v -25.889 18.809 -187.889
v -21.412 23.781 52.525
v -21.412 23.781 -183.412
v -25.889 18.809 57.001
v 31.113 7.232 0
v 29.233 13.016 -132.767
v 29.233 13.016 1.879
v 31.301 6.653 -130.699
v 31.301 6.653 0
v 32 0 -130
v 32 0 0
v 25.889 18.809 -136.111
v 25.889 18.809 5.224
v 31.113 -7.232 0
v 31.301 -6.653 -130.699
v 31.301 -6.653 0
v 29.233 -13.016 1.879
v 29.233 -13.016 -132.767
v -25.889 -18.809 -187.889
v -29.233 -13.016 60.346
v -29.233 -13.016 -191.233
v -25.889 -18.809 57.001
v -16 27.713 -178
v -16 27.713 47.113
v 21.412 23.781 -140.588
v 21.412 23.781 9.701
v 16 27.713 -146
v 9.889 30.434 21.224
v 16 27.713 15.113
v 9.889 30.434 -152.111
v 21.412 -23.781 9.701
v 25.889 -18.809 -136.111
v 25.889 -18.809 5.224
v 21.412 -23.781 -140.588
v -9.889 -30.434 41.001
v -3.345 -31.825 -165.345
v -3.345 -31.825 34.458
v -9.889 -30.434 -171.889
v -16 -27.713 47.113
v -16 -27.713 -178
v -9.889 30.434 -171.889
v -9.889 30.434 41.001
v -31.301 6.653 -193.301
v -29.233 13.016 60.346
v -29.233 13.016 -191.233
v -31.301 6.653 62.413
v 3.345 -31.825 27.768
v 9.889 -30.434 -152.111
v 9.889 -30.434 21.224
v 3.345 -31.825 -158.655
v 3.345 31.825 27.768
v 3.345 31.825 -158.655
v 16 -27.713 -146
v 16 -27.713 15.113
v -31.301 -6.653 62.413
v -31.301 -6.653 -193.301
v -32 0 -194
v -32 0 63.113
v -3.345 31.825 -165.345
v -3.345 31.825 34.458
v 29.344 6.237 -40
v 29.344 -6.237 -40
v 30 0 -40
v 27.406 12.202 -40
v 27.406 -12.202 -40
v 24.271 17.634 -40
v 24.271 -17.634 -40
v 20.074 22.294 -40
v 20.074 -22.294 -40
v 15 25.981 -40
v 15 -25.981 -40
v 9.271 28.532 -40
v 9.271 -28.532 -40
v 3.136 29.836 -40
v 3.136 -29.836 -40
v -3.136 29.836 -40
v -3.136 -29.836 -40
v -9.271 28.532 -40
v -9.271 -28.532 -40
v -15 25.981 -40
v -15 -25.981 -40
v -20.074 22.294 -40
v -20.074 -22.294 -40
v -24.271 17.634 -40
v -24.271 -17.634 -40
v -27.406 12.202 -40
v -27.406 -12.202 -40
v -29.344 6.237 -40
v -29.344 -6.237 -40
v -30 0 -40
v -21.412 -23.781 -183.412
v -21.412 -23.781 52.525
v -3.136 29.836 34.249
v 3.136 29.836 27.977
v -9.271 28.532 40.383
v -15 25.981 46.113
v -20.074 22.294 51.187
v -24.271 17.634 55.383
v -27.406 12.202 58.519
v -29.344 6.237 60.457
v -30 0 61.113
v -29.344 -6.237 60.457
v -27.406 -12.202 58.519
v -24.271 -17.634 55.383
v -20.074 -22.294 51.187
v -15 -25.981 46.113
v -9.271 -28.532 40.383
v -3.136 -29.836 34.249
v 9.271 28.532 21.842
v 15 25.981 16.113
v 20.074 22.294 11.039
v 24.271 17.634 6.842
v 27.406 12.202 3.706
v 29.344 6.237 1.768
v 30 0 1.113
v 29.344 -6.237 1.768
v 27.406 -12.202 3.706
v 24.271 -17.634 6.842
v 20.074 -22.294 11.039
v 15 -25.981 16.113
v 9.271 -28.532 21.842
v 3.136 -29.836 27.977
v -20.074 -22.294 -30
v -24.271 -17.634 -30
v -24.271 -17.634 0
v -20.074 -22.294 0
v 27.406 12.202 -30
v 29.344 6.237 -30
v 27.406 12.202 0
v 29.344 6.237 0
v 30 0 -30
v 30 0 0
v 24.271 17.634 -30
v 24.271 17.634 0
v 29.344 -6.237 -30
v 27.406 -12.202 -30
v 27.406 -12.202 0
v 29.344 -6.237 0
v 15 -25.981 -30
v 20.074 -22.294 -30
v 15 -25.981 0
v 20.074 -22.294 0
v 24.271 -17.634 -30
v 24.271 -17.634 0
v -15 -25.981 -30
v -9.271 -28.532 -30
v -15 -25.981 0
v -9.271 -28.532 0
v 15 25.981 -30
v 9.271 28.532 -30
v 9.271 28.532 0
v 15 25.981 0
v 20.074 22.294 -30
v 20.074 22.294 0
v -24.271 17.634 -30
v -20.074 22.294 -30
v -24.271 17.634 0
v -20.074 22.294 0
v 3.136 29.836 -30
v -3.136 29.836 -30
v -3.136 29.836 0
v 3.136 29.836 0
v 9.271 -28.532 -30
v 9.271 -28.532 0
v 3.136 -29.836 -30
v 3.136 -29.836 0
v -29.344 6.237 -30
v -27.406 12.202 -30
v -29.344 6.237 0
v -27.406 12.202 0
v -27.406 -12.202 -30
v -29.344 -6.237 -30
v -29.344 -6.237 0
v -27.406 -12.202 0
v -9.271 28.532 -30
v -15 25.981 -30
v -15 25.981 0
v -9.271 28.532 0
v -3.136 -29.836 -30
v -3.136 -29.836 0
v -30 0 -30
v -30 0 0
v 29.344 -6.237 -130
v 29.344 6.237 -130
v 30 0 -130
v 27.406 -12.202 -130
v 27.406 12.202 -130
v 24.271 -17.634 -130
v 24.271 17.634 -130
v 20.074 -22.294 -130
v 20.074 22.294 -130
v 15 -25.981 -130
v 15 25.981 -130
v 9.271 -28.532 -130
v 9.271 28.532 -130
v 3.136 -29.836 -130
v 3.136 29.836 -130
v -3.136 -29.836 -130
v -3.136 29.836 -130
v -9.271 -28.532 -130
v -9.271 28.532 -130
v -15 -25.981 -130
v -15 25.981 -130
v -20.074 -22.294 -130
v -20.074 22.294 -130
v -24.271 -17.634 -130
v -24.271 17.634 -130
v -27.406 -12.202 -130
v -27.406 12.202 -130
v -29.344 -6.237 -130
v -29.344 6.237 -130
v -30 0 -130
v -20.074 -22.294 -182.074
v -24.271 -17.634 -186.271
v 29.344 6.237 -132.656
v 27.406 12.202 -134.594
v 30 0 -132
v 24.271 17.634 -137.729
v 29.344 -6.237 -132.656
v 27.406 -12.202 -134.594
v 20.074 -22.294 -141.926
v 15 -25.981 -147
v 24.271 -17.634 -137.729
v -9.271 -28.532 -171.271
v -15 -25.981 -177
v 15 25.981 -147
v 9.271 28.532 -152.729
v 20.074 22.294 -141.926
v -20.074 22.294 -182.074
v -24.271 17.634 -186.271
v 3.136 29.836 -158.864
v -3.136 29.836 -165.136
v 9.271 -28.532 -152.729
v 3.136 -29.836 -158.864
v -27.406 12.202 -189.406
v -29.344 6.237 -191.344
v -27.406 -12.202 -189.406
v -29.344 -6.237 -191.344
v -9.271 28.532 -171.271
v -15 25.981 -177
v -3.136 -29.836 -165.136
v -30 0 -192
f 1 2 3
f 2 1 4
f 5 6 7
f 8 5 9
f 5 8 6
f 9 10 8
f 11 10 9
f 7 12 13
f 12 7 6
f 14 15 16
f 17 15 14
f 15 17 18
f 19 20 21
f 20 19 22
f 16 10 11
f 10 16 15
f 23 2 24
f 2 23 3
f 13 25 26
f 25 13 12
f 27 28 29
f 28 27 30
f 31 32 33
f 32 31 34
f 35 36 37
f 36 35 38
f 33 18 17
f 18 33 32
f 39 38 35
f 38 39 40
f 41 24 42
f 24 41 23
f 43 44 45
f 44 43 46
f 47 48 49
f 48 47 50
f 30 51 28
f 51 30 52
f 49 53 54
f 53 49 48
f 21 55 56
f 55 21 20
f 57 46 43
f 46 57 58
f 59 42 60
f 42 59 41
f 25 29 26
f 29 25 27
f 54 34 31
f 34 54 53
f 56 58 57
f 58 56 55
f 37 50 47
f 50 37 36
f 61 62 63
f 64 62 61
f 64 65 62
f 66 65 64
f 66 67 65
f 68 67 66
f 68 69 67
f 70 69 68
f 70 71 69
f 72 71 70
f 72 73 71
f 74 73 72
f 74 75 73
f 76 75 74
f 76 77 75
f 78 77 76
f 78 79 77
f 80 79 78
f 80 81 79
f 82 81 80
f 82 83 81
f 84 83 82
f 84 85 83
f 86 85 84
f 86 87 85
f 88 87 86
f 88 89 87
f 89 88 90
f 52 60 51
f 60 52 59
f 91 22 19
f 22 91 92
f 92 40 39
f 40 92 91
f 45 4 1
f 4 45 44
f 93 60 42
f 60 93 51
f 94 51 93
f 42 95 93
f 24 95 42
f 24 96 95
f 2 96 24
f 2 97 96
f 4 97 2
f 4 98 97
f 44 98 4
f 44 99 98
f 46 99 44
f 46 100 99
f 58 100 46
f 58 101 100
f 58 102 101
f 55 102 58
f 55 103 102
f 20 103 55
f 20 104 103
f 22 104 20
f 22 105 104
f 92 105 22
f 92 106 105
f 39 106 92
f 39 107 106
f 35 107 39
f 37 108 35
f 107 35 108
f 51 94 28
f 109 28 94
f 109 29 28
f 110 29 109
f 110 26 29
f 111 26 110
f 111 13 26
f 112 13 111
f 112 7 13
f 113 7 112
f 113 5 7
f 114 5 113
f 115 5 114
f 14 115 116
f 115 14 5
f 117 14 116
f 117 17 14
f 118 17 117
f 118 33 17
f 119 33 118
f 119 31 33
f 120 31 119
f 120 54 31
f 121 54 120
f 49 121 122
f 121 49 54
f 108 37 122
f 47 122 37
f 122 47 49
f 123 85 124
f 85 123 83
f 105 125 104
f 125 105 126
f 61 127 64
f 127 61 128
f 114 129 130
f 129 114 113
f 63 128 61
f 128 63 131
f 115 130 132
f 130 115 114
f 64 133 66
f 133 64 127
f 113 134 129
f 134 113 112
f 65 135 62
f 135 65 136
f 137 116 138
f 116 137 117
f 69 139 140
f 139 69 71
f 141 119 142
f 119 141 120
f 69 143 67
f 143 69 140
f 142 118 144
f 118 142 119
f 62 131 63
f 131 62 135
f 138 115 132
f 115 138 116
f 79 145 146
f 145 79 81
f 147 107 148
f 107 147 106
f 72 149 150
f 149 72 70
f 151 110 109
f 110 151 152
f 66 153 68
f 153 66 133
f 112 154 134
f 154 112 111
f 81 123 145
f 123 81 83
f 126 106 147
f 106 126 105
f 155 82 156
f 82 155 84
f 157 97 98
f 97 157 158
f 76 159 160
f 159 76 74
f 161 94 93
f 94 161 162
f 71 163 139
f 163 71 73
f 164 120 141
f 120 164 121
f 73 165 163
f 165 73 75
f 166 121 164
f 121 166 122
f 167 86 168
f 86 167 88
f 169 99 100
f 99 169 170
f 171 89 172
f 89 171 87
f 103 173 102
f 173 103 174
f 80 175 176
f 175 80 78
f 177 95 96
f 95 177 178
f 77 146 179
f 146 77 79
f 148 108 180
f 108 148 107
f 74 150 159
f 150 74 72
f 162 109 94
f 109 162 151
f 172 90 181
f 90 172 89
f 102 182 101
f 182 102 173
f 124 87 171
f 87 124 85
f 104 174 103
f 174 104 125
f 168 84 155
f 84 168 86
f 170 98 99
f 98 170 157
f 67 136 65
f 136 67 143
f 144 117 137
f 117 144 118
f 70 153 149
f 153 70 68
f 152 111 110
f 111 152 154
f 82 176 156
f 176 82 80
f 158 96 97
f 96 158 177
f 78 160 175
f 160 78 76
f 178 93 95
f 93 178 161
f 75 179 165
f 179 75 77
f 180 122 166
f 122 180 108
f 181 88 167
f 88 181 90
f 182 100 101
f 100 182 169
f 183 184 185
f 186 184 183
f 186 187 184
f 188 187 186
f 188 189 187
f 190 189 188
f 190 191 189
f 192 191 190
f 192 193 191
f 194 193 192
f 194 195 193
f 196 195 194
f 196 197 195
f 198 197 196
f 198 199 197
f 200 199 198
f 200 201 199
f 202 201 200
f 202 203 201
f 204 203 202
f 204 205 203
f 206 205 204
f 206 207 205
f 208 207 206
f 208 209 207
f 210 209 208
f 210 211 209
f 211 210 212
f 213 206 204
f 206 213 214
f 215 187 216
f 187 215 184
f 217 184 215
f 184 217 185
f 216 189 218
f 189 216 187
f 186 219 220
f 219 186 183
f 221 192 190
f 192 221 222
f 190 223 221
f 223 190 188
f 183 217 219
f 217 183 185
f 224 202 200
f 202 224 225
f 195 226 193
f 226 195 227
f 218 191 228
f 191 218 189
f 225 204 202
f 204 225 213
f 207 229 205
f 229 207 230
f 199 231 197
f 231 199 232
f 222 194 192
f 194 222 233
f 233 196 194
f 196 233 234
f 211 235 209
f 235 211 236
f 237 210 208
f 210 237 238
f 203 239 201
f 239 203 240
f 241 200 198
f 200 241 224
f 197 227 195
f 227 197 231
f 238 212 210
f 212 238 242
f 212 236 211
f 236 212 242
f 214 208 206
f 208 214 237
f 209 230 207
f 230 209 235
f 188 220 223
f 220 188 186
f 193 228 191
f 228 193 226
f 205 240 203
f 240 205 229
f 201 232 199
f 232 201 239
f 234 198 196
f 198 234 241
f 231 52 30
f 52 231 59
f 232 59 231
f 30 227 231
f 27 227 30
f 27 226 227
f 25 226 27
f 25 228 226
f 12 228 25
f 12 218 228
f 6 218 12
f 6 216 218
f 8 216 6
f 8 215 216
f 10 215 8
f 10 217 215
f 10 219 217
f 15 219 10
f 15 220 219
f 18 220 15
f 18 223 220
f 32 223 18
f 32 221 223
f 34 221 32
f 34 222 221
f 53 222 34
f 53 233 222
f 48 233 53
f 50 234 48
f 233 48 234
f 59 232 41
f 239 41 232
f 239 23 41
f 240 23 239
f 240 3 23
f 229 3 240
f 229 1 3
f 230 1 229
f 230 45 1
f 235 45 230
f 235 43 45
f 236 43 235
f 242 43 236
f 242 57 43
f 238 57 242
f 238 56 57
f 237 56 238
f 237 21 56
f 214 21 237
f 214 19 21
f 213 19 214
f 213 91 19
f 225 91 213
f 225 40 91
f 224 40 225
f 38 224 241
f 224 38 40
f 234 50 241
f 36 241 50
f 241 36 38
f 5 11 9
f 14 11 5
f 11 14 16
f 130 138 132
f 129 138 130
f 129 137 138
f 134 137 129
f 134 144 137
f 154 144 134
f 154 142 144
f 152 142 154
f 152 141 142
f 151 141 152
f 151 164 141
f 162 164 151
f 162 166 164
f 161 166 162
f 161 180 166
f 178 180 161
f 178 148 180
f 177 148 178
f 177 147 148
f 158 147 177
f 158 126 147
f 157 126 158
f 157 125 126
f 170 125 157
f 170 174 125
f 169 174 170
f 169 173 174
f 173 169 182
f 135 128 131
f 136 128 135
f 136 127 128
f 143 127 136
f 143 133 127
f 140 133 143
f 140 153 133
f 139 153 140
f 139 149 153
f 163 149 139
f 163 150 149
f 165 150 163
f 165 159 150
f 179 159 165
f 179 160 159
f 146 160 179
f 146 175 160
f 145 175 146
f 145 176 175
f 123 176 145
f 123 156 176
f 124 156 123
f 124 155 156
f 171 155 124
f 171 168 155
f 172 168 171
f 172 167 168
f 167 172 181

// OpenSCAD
// file: ../library/meca-comps/meca-comps.scad
// <img src="file:///G:/Mon%20Drive/Cspace%202023%20-%20Karlavagnen/Mod%C3%A9lisation%203D/library/meca-comps/aileron.png">

module aileron(m, n, E, p, epaisseur) {
    CubePoints = [
        [  0,       0,         0 ], //0
        [  E, m-(p+n),         0 ], //1
        [  E,     m-p,         0 ], //2
        [  0,       m,         0 ], //3
        [  0,       0, epaisseur ], //4
        [  E, m-(p+n), epaisseur ], //5
        [  E,     m-p, epaisseur ], //6
        [  0,       m, epaisseur ]  //7
    ];
    
    CubeFaces = [
        [0,1,2,3], // bottom
        [4,5,1,0], // front
        [7,6,5,4], // top
        [5,6,2,1], // right
        [6,7,3,2], // back
        [7,4,0,3]  // left
    ];
    
    translate([0,epaisseur/2,0]) rotate(a=[90,0,0]) color("grey") polyhedron( CubePoints, CubeFaces );
}

// <img src="file:///G:/Mon%20Drive/Cspace%202023%20-%20Karlavagnen/Mod%C3%A9lisation%203D/library/meca-comps/bague_creuse.png">

module bague_creuse(diametre_externe, diametre_interieur, epaisseur) {
    assert(diametre_externe > diametre_interieur, "Le diametre extérieur doit être plus grand que diametre intérieur")
    difference() {
        cylinder(h=epaisseur, d=diametre_externe);
        translate([0,0,-1]) cylinder(h=epaisseur+2, d=diametre_interieur);
    }
}

// <img src="file:///G:/Mon%20Drive/Cspace%202023%20-%20Karlavagnen/Mod%C3%A9lisation%203D/library/meca-comps/bague_de_poussee.png">

module bague_de_poussee(
    diametre_exterieur,
    diametre_intermediaire,
    diametre_interieur,
    epaisseur_exterieure,
    epaisseur_interieure
) {
    union() {
        bague_creuse(diametre_exterieur, diametre_interieur, epaisseur_exterieure, $fn=50);
        bague_creuse(diametre_intermediaire, diametre_interieur, epaisseur_interieure, $fn=50);
    }
}

// <img src="file:///G:/Mon%20Drive/Cspace%202023%20-%20Karlavagnen/Mod%C3%A9lisation%203D/library/meca-comps/bague_pleine.png">

module bague_pleine(diametre, epaisseur) {
    cylinder(h=epaisseur, d=diametre);
}

// <img src="file:///G:/Mon%20Drive/Cspace%202023%20-%20Karlavagnen/Mod%C3%A9lisation%203D/library/meca-comps/equerre.png">

module equerre(h1, h2, l, e){
    union() {
        cube(size=[h1,e,l]);
        cube(size=[e,h2,l]);
    }
}

// <img src="file:///G:/Mon%20Drive/Cspace%202023%20-%20Karlavagnen/Mod%C3%A9lisation%203D/library/meca-comps/guide_rampe.png">

module guide_rampe() {
    rotate([-90,0,0]) color("grey") union() {
        cylinder(d= 7, h=13);
        cylinder(d=12, h= 5);
        translate([0,0,10]) cylinder(d=12, h=3);
    }
}

// <img src="file:///G:/Mon%20Drive/Cspace%202023%20-%20Karlavagnen/Mod%C3%A9lisation%203D/library/meca-comps/ogive.png">

module ogive(hauteur, diametre, epaisseur) {
    difference() {
        ogive_pleine(hauteur, diametre);
        translate([0,0,-1 ]) ogive_pleine(hauteur-epaisseur+1, diametre-epaisseur);
    }
}

// <img src="file:///G:/Mon%20Drive/Cspace%202023%20-%20Karlavagnen/Mod%C3%A9lisation%203D/library/meca-comps/ogive_pleine.png">

module ogive_pleine(hauteur, diametre) {
    h_o = hauteur;
    d_o = diametre;
    r_o = d_o/2;

    rotate_extrude(angle=360, convexity=2)
    rotate(a=[0,0,90]) 
    intersection() {
        square([h_o,r_o]);
        resize([2*h_o, 0, 0]) circle(r_o, $fn=100);
    }
}

// <img src="file:///G:/Mon%20Drive/Cspace%202023%20-%20Karlavagnen/Mod%C3%A9lisation%203D/library/meca-comps/ressort.png">

module ressort(diametre=10, section=1, hauteur=20, nb_spire=10){
    //
    // Mendel90
    //
    // GNU GPL v2
    // nop.head@gmail.com
    // hydraraptor.blogspot.com
    //
    // Springs
    //

    extruder_spring = [ 7,    1, 10, 5];
    hob_spring      = [12, 0.75, 10, 6];

    function spring_od(type)     = type[0];
    function spring_gauge(type)  = type[1];
    function spring_length(type) = type[2];
    function spring_coils(type)  = type[3];

    // taken from openscad example 20
    module coil(r1 = 100, r2 = 10, h = 100, twists)
    {
        hr = h / (twists * 2);
        stepsize = 1/16;
        module segment(i1, i2) {
            alpha1 = i1 * 360*r2/hr;
            alpha2 = i2 * 360*r2/hr;
            len1 = sin(acos(i1*2-1))*r2;
            len2 = sin(acos(i2*2-1))*r2;
            if (len1 < 0.01)
                polygon([
                    [ cos(alpha1)*r1, sin(alpha1)*r1 ],
                    [ cos(alpha2)*(r1-len2), sin(alpha2)*(r1-len2) ],
                    [ cos(alpha2)*(r1+len2), sin(alpha2)*(r1+len2) ]
                ]);
            if (len2 < 0.01)
                polygon([
                    [ cos(alpha1)*(r1+len1), sin(alpha1)*(r1+len1) ],
                    [ cos(alpha1)*(r1-len1), sin(alpha1)*(r1-len1) ],
                    [ cos(alpha2)*r1, sin(alpha2)*r1 ],
                ]);
            if (len1 >= 0.01 && len2 >= 0.01)
                polygon([
                    [ cos(alpha1)*(r1+len1), sin(alpha1)*(r1+len1) ],
                    [ cos(alpha1)*(r1-len1), sin(alpha1)*(r1-len1) ],
                    [ cos(alpha2)*(r1-len2), sin(alpha2)*(r1-len2) ],
                    [ cos(alpha2)*(r1+len2), sin(alpha2)*(r1+len2) ]
                ]);
        }
        linear_extrude(height = h, twist = 180*h/hr,
                $fn = (hr/r2)/stepsize, convexity = 5) {
            for (i = [ stepsize : stepsize : 1+stepsize/2 ])
                segment(i-stepsize, min(i, 1));
        }
    }

    module comp_spring(type, l = 0) {
        l = (l == 0) ? spring_length(type) : l;

        coil(r1 = (spring_od(type) - spring_gauge(type)) / 2, r2 = spring_gauge(type) / 2, h = l, twists = spring_coils(type));

        if($children)
            translate([0, 0, l])
                children();
    }
    
    color("grey")
    comp_spring([diametre, section, hauteur, nb_spire]);
}

// <img src="file:///G:/Mon%20Drive/Cspace%202023%20-%20Karlavagnen/Mod%C3%A9lisation%203D/library/meca-comps/tube.png">

module tube(hauteur, diametre, epaisseur) {
    difference() {
        cylinder(h=hauteur, d=diametre);
        translate([0,0,-1]) cylinder(h=hauteur+2, d=diametre-epaisseur*2);
    }
}
// main file
use <../library/meca-comps/meca-comps.scad>

module venturi(){

difference() {
    translate([0,0,-40]) cylinder(r=32,h=130);
    rotate([0,45,0]) translate([-90,-70,22]) cube(180);
    translate([0,0,-40]) cylinder(r=30,h=130);
}

translate([0,0,-30]) cylinder(r=32,h=30);
translate([0,0,-60]) cylinder(r1=8,r2=32,h=20);
translate([0,0,-90]) cylinder(r=8,h=30);
translate([0,0,-100]) cylinder(r1=32,r2=8,h=20);
translate([0,0,-100]) cylinder(r1=30,r2=6,h=20);
translate([0,0,-130]) cylinder(r=32,h=30);
translate([0,0,-130]) cylinder(r=30,h=30);

difference() {
    translate([0,0,-260]) bague_creuse(64,60,130);
    // translate([0,0,-260]) cylinder(r=32,h=130);
    translate([-90,-70,-252]) rotate([0,45,0]) cube(180);
    // translate([0,0,-260]) cylinder(r=32,h=130);
}

color([0,0,0,0.5])
translate([0,0,-110])
cylinder(r=32,h=70);

}


venturi();
